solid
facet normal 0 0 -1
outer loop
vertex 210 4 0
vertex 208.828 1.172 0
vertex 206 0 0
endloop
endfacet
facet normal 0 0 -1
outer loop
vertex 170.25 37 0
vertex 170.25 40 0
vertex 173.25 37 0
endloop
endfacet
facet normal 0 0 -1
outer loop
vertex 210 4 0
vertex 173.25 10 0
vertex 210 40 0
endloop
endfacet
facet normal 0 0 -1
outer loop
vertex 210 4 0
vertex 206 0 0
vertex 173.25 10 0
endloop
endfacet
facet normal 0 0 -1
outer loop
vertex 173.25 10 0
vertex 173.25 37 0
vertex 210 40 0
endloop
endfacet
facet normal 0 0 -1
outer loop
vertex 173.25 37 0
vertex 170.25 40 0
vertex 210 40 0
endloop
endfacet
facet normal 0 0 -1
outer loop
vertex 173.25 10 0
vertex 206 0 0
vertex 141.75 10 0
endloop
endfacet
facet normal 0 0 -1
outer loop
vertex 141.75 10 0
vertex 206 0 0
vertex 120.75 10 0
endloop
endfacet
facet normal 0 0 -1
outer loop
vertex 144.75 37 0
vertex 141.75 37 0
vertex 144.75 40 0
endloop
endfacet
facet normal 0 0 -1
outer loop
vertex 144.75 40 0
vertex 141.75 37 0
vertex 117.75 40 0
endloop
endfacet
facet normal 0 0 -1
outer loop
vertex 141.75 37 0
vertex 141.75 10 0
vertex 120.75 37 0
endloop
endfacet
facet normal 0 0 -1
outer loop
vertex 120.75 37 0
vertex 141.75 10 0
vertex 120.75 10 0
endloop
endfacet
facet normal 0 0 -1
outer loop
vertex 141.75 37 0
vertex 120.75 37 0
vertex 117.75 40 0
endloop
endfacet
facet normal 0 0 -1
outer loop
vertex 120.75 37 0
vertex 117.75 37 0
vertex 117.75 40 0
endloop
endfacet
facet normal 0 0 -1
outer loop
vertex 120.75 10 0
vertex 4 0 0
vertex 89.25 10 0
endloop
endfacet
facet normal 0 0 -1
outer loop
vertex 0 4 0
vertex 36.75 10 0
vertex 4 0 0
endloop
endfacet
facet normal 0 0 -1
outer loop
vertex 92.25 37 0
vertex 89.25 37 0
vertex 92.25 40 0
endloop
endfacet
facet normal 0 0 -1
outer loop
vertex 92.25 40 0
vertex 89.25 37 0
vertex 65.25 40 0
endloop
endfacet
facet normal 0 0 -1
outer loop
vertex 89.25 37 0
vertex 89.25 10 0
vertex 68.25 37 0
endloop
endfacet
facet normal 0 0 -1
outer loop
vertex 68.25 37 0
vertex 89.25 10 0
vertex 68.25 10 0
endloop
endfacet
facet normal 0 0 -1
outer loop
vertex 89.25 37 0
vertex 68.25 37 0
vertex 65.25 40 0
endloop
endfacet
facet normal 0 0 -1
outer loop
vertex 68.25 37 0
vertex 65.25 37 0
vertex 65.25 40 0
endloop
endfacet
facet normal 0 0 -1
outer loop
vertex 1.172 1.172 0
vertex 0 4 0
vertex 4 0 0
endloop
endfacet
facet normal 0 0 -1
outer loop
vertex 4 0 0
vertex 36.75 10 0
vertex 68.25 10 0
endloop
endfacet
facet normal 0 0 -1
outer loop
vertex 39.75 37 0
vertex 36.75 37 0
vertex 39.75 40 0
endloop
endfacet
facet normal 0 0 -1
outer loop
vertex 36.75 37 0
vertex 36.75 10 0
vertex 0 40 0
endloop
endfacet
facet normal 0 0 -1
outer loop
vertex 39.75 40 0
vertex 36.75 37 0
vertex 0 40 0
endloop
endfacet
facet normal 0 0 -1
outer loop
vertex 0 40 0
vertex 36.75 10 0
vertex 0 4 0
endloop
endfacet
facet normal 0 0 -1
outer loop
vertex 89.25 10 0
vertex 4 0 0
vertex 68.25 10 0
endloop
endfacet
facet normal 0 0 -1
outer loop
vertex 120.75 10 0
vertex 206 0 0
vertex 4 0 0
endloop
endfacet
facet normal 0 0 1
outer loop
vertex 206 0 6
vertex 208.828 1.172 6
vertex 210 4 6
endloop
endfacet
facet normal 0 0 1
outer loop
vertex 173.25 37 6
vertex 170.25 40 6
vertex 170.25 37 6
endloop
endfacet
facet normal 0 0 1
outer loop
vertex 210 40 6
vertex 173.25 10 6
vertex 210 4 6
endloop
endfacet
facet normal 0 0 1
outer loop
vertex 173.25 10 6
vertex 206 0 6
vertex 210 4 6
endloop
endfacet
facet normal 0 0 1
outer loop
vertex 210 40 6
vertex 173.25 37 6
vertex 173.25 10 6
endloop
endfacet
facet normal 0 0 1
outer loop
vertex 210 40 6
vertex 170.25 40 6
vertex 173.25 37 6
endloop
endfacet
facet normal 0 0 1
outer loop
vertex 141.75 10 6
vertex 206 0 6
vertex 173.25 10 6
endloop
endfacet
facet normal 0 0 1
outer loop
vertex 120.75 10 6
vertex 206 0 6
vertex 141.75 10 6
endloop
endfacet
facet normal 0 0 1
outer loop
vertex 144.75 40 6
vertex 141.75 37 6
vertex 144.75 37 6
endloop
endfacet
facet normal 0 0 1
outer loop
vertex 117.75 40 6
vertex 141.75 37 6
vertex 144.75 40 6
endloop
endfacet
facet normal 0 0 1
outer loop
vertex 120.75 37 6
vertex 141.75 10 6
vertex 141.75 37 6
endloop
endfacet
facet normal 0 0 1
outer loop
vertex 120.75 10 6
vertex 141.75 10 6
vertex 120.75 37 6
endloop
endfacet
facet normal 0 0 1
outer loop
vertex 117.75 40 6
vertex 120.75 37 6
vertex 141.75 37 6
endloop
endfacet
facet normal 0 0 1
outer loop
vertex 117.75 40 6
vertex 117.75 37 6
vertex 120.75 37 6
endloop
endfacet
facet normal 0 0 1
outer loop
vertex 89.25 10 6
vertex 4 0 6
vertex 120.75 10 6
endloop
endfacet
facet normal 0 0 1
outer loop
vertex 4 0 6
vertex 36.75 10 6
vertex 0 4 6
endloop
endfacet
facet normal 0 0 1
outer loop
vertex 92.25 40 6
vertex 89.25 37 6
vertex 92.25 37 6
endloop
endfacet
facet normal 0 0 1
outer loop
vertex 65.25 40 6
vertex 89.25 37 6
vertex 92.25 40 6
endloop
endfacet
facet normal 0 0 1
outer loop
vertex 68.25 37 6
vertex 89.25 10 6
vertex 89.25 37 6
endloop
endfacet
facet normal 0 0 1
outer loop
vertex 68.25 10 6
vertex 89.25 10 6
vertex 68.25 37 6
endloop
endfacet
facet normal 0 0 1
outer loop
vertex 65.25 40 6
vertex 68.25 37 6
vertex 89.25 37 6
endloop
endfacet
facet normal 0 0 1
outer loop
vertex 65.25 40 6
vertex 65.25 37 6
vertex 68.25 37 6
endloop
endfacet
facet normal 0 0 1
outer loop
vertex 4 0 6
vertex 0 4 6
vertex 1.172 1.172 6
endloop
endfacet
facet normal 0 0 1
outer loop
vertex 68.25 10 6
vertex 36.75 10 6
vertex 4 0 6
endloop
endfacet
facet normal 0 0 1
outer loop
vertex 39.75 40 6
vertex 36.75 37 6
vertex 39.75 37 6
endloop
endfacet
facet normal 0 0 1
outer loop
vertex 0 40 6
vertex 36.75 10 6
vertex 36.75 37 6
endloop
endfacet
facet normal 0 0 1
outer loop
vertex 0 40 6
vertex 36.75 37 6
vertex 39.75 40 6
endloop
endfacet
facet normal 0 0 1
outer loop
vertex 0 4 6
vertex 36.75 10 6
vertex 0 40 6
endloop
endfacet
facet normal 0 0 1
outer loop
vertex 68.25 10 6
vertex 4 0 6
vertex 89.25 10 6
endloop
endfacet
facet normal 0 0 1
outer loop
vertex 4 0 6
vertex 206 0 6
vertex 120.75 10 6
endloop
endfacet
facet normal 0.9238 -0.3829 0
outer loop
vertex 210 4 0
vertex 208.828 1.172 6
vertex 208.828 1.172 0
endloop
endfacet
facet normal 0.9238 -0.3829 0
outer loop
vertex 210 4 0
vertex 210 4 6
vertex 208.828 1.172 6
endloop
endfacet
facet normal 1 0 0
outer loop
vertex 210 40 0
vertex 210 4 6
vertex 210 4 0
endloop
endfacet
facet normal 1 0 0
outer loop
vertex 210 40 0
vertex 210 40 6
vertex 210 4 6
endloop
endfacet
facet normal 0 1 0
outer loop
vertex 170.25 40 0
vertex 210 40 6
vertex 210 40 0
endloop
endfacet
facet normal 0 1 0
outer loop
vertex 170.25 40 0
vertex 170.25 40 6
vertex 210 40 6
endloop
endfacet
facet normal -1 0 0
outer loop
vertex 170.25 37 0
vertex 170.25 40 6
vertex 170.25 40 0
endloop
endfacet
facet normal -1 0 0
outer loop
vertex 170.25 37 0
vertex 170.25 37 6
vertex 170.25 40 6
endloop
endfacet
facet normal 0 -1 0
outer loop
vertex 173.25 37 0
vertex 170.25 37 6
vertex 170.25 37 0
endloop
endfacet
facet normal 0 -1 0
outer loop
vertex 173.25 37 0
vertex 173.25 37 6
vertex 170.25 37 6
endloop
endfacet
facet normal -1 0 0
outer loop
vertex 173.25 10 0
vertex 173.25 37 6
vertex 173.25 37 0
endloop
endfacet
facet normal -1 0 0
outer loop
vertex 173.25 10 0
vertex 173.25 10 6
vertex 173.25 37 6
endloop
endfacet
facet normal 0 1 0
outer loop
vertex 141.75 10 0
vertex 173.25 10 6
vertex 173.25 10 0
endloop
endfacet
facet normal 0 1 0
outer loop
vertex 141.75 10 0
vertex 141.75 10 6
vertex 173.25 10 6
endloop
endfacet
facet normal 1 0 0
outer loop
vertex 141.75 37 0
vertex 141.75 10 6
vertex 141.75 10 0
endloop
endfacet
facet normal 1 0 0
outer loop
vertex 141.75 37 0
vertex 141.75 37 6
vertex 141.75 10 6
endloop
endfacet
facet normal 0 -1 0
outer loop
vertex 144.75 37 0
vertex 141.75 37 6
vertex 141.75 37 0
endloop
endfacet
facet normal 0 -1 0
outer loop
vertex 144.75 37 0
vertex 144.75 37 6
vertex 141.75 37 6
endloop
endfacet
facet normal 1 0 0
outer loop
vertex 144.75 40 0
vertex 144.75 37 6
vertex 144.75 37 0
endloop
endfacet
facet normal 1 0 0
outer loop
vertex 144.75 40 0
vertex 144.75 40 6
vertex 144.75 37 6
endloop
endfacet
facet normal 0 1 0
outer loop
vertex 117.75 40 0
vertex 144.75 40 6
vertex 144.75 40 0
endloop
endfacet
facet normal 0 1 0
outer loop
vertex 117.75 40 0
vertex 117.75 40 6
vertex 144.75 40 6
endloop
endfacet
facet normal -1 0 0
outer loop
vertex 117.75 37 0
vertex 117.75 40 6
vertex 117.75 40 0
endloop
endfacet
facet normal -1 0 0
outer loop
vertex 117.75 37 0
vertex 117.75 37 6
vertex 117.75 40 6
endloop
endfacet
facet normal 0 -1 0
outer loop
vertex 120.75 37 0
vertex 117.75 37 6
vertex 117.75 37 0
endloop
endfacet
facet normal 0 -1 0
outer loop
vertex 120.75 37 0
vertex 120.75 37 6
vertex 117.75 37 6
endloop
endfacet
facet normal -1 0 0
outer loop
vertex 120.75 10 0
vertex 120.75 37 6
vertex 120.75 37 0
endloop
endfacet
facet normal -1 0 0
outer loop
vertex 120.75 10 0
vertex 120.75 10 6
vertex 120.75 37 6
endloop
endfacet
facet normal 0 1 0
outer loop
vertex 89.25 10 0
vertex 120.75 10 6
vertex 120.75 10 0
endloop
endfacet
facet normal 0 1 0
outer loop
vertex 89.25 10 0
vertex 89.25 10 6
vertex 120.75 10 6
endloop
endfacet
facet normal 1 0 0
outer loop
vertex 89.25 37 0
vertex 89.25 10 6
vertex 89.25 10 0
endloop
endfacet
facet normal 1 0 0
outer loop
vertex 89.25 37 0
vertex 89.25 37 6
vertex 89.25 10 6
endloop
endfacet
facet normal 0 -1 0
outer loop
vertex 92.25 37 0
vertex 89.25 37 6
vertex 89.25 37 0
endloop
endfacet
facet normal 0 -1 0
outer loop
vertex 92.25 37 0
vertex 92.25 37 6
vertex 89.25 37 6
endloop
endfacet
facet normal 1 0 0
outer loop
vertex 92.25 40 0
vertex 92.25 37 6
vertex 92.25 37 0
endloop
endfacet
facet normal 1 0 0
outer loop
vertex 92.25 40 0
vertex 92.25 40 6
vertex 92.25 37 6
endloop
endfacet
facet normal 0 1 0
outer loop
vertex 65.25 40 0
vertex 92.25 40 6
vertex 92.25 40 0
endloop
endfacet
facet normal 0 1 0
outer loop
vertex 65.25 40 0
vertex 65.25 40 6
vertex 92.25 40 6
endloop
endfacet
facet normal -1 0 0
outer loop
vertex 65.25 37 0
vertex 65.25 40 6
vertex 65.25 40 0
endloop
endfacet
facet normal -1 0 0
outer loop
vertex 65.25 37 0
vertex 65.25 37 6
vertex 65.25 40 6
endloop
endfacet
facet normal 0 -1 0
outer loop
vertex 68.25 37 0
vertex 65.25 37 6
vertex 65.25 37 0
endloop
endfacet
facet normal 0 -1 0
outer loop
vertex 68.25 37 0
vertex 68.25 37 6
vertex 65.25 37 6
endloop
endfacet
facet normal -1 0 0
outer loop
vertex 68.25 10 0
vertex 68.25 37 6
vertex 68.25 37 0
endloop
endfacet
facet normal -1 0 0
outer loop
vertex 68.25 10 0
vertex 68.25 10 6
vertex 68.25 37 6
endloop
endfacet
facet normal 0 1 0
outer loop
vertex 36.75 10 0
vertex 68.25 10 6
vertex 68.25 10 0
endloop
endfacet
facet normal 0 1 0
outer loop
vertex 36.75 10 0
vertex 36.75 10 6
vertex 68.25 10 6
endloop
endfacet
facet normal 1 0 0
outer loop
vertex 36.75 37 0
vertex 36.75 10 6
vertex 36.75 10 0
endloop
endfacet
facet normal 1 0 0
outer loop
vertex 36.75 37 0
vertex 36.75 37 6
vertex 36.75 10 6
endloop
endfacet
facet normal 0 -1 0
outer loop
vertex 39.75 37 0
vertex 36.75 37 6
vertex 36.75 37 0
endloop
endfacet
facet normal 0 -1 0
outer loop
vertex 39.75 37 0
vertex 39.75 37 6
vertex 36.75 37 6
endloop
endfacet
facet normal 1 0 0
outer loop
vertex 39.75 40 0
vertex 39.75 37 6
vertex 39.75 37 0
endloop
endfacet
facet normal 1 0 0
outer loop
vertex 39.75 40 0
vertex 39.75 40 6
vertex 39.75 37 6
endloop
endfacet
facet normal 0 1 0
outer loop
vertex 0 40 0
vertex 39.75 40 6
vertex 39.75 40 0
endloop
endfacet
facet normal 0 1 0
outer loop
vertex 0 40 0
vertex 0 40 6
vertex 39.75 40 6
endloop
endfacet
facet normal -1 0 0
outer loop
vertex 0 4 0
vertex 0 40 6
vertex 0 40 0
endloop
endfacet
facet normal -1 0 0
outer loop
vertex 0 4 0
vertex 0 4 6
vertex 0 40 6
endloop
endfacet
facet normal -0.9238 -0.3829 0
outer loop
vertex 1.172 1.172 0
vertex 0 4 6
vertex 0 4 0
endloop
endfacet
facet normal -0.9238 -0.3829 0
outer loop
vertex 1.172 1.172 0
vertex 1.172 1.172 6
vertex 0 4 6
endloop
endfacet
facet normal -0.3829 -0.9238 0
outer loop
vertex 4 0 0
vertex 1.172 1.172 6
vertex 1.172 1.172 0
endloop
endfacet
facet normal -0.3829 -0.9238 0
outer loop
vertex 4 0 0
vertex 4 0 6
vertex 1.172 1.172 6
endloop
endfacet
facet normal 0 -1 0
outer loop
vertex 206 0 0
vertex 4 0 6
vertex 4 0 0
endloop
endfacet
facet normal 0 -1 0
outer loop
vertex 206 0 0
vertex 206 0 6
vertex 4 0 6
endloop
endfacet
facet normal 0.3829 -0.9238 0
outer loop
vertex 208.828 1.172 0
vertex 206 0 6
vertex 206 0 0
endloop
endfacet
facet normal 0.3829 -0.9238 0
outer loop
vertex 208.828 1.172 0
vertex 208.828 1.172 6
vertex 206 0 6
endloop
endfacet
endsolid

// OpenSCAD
$fn = 32;

// ----------------------------------------------------------------------
// Oversize slot bar: 210 mm bar with 3 oversize windows
// ----------------------------------------------------------------------

// --- parameters (mm) ---
profile_height = 6;       // extrusion height
profile_points = 32;      // points of the closed outline

profile = [[0, 4], [1.172, 1.172], [4, 0], [206, 0], [208.828, 1.172], [210, 4], [210, 40], [170.25, 40], [170.25, 37], [173.25, 37], [173.25, 10], [141.75, 10], [141.75, 37], [144.75, 37], [144.75, 40], [117.75, 40], [117.75, 37], [120.75, 37], [120.75, 10], [89.25, 10], [89.25, 37], [92.25, 37], [92.25, 40], [65.25, 40], [65.25, 37], [68.25, 37], [68.25, 10], [36.75, 10], [36.75, 37], [39.75, 37], [39.75, 40], [0, 40]];  // single closed polygon, 32 points, counter clockwise

// --- the one profile operation ---
linear_extrude(height = profile_height) polygon(points = profile);
